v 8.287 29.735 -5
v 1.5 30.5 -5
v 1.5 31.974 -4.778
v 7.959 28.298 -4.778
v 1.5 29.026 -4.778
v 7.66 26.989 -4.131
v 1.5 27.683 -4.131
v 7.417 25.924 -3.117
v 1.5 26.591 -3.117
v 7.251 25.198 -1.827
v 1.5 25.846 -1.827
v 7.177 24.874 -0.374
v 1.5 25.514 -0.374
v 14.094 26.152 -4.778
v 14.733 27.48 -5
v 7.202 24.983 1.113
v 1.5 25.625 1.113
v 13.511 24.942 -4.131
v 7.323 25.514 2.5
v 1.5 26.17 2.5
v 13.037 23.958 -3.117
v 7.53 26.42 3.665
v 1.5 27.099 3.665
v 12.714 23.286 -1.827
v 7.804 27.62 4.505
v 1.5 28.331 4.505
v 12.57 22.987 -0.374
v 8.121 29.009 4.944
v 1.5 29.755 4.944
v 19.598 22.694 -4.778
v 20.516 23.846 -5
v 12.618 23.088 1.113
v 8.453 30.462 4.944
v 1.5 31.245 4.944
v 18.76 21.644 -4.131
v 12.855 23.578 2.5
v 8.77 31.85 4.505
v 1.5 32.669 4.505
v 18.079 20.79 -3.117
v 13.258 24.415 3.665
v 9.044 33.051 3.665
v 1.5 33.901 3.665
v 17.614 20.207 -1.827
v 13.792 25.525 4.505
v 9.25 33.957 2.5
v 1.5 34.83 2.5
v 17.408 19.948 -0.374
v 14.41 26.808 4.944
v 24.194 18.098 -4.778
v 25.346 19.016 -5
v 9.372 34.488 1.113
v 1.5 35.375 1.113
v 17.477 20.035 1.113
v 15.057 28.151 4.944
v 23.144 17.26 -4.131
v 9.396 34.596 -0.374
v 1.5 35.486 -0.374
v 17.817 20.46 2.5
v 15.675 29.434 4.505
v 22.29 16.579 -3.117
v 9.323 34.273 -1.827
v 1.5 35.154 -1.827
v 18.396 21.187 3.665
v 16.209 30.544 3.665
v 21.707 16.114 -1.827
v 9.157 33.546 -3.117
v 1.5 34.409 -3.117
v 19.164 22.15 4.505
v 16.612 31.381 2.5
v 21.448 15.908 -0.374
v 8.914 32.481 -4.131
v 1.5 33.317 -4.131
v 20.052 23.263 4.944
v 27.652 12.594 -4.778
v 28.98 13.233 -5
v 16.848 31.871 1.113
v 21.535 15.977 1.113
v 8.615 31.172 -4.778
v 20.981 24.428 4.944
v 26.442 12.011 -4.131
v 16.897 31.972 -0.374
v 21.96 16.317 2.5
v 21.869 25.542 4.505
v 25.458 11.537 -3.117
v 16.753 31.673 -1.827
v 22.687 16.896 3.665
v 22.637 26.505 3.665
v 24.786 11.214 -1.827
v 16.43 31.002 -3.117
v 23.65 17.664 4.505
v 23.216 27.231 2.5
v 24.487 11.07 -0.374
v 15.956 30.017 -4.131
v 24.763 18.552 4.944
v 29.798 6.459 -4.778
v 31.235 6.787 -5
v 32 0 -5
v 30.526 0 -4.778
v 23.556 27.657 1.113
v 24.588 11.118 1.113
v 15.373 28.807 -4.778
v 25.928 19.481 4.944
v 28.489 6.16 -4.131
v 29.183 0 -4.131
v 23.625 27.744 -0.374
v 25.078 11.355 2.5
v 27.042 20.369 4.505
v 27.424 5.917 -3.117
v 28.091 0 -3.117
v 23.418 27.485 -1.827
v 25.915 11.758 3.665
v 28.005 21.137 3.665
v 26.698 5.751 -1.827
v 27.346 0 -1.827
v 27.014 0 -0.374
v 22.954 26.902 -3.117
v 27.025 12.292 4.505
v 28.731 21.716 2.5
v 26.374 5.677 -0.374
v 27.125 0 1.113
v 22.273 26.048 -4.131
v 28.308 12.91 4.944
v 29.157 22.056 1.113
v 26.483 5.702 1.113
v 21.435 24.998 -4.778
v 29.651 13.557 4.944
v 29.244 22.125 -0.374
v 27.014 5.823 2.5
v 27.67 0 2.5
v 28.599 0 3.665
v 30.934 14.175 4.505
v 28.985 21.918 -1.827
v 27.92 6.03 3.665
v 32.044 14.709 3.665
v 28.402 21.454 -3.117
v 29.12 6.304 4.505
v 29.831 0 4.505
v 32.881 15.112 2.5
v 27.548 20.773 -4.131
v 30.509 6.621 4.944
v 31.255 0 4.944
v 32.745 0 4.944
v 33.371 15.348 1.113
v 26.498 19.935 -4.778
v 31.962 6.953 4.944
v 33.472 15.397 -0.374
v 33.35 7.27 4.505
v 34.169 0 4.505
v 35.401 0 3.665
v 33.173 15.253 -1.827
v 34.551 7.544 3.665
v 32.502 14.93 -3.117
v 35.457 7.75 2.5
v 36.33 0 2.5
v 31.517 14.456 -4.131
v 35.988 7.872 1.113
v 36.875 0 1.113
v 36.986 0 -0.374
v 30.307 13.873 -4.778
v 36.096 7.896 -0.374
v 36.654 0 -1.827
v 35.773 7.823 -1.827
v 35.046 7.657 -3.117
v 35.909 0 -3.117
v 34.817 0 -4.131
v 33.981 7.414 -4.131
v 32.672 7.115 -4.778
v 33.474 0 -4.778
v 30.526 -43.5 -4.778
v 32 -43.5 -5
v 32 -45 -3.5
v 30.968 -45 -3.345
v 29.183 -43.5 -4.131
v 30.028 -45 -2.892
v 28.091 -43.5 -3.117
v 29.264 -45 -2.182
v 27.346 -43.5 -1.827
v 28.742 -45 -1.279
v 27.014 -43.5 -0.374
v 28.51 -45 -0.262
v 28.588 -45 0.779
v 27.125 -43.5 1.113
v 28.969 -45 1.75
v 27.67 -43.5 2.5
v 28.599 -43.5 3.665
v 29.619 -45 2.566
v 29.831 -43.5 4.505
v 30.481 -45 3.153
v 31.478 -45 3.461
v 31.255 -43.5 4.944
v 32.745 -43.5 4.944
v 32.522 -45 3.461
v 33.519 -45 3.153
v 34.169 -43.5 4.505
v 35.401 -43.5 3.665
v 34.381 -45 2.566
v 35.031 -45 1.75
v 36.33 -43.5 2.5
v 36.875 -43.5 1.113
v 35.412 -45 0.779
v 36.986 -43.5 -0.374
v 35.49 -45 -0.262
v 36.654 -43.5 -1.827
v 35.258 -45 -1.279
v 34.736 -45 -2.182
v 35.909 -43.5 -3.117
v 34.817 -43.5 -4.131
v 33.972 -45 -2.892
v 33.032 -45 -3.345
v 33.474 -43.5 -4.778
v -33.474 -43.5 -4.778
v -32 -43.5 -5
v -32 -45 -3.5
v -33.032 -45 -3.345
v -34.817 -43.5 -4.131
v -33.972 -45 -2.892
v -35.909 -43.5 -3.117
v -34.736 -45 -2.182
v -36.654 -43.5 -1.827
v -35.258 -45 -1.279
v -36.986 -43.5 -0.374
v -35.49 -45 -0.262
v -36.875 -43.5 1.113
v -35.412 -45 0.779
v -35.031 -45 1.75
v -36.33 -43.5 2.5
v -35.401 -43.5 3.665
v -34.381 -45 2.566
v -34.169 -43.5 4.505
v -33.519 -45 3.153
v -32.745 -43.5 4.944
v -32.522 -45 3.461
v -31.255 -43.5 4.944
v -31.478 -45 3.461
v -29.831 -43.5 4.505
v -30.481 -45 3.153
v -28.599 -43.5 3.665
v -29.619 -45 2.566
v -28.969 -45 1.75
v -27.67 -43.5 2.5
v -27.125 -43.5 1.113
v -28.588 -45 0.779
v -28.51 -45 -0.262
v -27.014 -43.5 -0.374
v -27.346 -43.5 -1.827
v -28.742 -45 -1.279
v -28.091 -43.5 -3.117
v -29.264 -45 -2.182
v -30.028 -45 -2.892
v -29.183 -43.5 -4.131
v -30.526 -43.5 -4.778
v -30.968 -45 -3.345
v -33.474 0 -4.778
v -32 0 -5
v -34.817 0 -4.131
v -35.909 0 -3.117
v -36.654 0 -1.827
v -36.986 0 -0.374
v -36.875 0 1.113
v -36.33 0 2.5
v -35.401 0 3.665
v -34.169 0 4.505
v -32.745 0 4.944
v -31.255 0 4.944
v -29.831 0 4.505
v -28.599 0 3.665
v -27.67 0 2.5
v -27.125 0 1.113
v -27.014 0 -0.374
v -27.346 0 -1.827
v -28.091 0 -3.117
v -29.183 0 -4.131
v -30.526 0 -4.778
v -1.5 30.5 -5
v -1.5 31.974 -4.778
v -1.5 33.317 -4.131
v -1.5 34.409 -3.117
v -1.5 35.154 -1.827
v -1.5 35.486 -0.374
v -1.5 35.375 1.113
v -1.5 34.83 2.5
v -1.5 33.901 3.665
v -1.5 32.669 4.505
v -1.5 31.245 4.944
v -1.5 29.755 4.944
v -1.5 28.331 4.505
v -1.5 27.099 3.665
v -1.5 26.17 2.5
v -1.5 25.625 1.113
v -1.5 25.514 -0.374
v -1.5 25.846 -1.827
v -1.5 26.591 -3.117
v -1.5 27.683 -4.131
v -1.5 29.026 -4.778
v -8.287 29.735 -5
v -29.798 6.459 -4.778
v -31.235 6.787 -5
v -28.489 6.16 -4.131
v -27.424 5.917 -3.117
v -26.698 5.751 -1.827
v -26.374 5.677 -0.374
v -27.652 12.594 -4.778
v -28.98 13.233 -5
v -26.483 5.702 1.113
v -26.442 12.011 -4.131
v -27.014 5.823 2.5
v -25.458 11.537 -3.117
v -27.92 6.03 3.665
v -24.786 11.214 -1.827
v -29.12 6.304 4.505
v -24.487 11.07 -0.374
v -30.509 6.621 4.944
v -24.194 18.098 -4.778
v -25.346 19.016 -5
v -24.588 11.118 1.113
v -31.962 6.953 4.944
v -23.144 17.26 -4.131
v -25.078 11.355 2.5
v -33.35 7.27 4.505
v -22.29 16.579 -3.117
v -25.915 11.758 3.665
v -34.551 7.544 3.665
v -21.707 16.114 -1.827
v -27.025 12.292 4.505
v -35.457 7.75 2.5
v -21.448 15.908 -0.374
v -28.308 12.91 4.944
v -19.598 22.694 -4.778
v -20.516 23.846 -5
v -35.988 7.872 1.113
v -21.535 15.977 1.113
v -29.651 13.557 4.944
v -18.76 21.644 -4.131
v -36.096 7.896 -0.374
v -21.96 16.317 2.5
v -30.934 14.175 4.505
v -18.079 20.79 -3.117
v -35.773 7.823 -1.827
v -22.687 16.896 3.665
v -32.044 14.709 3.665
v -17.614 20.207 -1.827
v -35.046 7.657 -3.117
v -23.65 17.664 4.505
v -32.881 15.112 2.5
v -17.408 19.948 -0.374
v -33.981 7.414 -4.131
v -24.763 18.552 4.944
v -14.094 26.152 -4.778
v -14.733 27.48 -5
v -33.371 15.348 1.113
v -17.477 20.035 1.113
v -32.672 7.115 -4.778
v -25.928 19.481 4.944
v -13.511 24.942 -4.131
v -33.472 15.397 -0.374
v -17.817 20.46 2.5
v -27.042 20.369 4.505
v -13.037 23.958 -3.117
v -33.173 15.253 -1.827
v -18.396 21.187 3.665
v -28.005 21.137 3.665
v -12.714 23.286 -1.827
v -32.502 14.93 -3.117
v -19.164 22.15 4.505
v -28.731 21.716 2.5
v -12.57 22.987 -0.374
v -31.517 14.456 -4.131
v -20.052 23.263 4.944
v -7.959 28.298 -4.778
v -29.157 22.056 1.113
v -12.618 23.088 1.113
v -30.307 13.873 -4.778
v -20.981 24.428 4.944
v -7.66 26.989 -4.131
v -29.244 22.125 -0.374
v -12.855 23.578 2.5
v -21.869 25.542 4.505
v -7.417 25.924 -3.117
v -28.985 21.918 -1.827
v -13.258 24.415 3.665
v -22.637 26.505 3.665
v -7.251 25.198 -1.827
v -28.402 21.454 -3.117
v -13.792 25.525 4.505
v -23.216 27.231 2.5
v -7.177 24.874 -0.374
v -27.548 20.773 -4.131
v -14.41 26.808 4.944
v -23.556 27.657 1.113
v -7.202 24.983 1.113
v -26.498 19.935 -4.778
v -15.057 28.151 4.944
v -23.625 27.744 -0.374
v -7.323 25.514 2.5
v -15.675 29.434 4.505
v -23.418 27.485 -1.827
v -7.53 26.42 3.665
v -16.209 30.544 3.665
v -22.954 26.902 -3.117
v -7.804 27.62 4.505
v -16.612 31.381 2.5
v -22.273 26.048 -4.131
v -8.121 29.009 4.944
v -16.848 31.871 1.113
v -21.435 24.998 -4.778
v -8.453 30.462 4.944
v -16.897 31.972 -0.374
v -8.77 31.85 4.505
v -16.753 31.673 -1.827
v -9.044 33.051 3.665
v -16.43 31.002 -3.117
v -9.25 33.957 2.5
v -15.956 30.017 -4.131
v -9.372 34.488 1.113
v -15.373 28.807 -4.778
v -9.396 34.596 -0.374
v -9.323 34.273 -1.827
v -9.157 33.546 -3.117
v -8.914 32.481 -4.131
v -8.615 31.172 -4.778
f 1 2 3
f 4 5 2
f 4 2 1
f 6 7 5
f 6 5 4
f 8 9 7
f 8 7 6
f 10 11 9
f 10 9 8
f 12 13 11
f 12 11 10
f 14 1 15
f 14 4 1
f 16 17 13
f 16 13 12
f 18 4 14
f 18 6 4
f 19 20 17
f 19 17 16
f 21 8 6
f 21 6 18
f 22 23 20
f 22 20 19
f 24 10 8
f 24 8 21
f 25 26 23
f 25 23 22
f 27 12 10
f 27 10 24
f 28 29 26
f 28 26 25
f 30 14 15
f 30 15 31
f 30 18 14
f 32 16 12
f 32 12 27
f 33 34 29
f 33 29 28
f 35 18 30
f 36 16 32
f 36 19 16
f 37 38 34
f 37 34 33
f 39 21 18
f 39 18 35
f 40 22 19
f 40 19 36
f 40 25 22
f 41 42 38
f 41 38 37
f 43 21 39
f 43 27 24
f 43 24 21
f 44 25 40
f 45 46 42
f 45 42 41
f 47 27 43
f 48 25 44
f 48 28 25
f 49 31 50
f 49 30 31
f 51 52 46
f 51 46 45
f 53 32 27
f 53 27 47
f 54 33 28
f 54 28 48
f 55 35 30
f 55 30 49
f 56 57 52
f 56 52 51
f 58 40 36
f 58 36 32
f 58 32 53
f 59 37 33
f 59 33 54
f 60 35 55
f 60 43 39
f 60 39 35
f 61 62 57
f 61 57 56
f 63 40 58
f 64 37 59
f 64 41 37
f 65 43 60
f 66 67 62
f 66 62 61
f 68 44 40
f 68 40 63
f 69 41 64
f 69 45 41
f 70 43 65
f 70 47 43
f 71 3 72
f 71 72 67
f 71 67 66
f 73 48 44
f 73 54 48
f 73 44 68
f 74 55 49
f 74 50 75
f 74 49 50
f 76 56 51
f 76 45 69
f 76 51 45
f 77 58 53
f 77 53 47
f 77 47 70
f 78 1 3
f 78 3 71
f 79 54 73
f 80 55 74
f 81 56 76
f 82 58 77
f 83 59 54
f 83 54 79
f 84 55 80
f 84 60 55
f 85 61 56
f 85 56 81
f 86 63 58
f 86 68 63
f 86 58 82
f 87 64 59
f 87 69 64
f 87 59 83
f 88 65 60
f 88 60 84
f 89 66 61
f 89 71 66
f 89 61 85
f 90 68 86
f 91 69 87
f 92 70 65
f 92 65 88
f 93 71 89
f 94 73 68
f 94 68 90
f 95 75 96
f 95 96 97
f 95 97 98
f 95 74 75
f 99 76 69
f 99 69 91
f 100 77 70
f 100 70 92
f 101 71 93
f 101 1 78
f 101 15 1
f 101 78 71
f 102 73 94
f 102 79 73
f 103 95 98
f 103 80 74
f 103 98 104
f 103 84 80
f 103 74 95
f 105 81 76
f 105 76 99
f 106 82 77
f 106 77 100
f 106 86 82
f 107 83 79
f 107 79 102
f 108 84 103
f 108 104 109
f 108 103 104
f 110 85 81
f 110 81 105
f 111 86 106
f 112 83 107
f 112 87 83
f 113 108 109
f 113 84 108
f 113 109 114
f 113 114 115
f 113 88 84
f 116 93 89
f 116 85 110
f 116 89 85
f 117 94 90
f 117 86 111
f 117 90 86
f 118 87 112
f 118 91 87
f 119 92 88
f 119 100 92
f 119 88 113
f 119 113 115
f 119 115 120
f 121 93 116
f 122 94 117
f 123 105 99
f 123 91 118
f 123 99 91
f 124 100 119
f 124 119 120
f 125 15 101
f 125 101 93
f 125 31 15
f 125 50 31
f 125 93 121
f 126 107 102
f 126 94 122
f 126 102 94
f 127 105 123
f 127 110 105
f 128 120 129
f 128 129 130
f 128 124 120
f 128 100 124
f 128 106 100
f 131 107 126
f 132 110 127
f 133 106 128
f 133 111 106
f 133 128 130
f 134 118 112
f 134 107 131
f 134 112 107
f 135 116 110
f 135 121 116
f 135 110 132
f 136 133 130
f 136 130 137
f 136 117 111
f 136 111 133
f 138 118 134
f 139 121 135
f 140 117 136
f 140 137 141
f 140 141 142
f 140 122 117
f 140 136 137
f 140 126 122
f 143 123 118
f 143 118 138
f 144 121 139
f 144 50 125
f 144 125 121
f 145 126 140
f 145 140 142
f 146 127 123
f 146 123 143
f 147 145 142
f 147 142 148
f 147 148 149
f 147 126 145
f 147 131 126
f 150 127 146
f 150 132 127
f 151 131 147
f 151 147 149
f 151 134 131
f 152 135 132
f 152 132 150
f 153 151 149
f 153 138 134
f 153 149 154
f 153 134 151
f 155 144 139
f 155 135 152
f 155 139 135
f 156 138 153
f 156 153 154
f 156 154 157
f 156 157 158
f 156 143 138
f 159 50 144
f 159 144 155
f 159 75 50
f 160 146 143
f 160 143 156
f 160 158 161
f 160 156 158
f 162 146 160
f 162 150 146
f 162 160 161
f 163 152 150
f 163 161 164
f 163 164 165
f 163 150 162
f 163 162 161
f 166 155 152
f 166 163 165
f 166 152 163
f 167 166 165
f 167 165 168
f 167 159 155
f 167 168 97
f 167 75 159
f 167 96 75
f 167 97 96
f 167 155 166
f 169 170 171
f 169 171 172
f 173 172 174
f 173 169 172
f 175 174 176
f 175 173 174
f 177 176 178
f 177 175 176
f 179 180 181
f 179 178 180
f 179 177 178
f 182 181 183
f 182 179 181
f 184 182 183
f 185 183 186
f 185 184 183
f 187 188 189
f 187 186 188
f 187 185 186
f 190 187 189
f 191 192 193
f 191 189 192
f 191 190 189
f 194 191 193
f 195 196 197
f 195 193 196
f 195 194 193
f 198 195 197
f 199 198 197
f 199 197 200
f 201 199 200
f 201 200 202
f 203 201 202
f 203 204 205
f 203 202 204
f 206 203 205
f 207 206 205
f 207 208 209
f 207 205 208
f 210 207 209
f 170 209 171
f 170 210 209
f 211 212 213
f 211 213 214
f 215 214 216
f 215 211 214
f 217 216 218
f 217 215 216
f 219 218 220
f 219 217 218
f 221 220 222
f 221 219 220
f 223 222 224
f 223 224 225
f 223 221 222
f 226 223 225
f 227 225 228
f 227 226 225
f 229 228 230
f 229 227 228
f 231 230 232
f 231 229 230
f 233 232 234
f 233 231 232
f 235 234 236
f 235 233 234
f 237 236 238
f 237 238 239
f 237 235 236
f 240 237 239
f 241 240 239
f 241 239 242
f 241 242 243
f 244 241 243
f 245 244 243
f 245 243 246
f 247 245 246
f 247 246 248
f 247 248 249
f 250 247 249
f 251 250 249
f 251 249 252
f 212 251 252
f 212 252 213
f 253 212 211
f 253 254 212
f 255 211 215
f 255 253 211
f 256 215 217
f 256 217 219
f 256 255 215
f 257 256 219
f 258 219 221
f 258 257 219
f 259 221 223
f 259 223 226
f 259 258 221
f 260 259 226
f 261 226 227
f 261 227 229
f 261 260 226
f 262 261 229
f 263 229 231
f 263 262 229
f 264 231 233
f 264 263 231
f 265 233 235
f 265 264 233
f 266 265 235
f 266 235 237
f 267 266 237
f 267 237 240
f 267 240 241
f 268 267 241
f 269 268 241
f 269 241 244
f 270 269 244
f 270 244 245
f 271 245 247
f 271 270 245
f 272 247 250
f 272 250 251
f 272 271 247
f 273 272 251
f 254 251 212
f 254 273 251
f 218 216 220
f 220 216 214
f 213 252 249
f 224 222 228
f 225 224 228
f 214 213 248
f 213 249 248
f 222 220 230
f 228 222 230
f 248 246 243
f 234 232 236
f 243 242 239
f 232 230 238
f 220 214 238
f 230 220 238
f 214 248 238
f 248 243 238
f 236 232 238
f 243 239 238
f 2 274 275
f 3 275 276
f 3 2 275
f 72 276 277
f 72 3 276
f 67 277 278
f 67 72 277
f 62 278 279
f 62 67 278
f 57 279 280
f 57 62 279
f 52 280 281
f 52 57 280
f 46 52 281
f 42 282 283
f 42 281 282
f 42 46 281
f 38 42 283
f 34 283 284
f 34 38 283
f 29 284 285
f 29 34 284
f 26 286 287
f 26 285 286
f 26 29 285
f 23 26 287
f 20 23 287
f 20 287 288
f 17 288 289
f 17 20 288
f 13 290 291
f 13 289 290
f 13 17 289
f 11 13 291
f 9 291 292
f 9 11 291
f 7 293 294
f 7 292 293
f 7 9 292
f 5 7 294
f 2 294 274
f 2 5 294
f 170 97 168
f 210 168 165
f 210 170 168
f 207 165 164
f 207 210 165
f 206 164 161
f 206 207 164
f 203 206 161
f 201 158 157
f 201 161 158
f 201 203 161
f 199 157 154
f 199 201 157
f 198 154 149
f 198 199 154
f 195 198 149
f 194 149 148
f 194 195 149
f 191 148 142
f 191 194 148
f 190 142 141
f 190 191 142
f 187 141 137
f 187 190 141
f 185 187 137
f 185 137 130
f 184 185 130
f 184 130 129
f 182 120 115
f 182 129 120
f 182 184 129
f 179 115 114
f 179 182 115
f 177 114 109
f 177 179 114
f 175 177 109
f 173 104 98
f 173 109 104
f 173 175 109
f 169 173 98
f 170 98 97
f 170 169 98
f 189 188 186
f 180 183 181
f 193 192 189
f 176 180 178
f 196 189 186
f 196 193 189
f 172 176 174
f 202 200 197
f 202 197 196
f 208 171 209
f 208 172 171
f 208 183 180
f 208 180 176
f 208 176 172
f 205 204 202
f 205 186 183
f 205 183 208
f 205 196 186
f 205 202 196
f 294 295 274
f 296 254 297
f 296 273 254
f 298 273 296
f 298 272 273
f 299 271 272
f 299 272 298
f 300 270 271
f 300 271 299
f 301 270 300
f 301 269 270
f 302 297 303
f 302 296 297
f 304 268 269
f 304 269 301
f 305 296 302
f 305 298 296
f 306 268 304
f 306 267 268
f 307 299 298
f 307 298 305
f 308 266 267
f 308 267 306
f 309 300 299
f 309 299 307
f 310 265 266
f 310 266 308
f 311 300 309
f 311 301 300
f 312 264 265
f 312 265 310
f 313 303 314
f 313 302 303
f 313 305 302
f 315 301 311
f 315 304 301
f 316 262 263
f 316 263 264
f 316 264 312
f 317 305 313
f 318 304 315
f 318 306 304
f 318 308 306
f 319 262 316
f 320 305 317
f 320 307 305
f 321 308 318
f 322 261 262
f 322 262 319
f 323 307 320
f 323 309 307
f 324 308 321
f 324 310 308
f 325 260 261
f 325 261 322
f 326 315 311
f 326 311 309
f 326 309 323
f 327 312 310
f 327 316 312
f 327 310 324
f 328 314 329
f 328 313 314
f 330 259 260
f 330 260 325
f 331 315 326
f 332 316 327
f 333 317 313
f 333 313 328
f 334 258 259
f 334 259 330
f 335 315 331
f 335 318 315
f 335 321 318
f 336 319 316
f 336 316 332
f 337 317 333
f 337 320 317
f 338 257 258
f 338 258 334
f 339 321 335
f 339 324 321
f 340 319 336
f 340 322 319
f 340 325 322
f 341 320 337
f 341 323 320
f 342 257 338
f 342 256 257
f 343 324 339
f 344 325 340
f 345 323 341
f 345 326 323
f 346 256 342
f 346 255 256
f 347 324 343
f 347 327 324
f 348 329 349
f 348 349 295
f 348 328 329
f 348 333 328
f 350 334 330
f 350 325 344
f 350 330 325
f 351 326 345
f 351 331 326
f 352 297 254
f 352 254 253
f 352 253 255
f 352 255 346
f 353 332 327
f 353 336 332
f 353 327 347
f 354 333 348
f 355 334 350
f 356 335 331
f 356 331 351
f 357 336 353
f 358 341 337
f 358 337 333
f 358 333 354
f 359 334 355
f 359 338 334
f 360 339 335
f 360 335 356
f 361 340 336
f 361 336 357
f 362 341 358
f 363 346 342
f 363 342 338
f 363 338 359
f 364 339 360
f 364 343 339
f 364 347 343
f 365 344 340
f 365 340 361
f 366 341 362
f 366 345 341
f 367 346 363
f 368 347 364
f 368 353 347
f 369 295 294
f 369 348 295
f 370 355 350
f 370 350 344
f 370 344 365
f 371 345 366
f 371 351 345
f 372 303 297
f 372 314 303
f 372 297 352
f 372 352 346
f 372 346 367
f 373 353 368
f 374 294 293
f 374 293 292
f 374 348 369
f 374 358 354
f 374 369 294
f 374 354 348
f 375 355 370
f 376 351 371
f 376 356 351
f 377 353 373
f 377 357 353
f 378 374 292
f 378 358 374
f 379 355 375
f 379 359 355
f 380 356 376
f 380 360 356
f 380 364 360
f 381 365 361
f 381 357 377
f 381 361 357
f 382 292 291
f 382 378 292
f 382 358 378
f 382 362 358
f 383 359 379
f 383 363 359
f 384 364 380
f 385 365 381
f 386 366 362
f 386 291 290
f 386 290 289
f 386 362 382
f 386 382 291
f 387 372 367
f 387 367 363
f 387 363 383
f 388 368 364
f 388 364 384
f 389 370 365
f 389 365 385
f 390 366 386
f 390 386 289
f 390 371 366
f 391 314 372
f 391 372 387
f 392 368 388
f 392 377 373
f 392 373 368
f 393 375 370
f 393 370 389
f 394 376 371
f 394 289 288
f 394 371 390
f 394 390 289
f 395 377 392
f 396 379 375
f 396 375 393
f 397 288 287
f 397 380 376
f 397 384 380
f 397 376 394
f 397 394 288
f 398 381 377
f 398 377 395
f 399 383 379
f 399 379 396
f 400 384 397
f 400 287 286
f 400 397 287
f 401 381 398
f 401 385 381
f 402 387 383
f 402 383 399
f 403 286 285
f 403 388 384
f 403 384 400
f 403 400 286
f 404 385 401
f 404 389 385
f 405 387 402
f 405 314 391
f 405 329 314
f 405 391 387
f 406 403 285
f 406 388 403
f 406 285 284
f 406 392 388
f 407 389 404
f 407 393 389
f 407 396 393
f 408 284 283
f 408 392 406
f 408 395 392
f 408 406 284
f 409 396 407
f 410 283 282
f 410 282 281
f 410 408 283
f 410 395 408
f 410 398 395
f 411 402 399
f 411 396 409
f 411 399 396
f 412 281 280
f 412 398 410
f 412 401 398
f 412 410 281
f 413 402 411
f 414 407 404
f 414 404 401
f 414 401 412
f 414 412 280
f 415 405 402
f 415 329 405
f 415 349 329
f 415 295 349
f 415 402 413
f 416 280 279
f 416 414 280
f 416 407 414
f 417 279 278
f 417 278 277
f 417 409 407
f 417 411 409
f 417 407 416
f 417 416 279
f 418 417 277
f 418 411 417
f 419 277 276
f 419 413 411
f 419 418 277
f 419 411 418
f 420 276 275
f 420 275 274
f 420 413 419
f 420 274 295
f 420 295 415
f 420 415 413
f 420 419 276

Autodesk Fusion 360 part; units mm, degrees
sketch "Sketch3" plane through (0, 0, 0) normal (0, 0, 1) x (1, 0, 0)
  line L0 (0, 0) -> (32, 0) construction
  line L1 (0, 0) -> (0, 48) construction
  line L2 (0, 0) -> (-32, 0) construction
  line L3 (32, 0) -> (32, -45)
  line L4 (-32, 0) -> (-32, -45)
  circle A0 centre (0, 0) radius 24.5 construction
  circle A1 centre (0, 0) radius 30.5 construction
  line L5 (0, 30.5) -> (-1.5, 30.5)
  line L6 (-32, 0) -> (-32, 0)
  arc A2 (-1.5, 30.5) -> (-32, 0) centre (-1.5, 0) ccw
  line L7 (32, 0) -> (32, 0)
  arc A3 (32, 0) -> (1.5, 30.5) centre (1.5, 0) ccw
  line L8 (0, 30.5) -> (1.5, 30.5)
  dimension "d22" = 32
  dimension "d23" = 45
  dimension "d24" = 45
  dimension "d25" = 49
  dimension "d26" = 6
  dimension "d27" = 30.5
sketch "Sketch4" plane through (0, 0, 0) normal (1, 0, 0) x (0, 0, -1)
  circle A0 centre (0, 30.5) radius 5
  point P0 (0, 30.5)
  dimension "d28" = 10
sweep "Sweep2" add profiles "Sketch4" path "Sketch3" along L3 A3 L8 L5 A2 L4 section 1
chamfer "Chamfer2" distance 1.5 angle 45 2 edges at (-33.8081, -45, 4.6616) (30.1919, -45, 4.6616)
thread "Thread3"
thread "Thread4"
equation "d22 = ( 64 / 2 ) * 1 mm"
